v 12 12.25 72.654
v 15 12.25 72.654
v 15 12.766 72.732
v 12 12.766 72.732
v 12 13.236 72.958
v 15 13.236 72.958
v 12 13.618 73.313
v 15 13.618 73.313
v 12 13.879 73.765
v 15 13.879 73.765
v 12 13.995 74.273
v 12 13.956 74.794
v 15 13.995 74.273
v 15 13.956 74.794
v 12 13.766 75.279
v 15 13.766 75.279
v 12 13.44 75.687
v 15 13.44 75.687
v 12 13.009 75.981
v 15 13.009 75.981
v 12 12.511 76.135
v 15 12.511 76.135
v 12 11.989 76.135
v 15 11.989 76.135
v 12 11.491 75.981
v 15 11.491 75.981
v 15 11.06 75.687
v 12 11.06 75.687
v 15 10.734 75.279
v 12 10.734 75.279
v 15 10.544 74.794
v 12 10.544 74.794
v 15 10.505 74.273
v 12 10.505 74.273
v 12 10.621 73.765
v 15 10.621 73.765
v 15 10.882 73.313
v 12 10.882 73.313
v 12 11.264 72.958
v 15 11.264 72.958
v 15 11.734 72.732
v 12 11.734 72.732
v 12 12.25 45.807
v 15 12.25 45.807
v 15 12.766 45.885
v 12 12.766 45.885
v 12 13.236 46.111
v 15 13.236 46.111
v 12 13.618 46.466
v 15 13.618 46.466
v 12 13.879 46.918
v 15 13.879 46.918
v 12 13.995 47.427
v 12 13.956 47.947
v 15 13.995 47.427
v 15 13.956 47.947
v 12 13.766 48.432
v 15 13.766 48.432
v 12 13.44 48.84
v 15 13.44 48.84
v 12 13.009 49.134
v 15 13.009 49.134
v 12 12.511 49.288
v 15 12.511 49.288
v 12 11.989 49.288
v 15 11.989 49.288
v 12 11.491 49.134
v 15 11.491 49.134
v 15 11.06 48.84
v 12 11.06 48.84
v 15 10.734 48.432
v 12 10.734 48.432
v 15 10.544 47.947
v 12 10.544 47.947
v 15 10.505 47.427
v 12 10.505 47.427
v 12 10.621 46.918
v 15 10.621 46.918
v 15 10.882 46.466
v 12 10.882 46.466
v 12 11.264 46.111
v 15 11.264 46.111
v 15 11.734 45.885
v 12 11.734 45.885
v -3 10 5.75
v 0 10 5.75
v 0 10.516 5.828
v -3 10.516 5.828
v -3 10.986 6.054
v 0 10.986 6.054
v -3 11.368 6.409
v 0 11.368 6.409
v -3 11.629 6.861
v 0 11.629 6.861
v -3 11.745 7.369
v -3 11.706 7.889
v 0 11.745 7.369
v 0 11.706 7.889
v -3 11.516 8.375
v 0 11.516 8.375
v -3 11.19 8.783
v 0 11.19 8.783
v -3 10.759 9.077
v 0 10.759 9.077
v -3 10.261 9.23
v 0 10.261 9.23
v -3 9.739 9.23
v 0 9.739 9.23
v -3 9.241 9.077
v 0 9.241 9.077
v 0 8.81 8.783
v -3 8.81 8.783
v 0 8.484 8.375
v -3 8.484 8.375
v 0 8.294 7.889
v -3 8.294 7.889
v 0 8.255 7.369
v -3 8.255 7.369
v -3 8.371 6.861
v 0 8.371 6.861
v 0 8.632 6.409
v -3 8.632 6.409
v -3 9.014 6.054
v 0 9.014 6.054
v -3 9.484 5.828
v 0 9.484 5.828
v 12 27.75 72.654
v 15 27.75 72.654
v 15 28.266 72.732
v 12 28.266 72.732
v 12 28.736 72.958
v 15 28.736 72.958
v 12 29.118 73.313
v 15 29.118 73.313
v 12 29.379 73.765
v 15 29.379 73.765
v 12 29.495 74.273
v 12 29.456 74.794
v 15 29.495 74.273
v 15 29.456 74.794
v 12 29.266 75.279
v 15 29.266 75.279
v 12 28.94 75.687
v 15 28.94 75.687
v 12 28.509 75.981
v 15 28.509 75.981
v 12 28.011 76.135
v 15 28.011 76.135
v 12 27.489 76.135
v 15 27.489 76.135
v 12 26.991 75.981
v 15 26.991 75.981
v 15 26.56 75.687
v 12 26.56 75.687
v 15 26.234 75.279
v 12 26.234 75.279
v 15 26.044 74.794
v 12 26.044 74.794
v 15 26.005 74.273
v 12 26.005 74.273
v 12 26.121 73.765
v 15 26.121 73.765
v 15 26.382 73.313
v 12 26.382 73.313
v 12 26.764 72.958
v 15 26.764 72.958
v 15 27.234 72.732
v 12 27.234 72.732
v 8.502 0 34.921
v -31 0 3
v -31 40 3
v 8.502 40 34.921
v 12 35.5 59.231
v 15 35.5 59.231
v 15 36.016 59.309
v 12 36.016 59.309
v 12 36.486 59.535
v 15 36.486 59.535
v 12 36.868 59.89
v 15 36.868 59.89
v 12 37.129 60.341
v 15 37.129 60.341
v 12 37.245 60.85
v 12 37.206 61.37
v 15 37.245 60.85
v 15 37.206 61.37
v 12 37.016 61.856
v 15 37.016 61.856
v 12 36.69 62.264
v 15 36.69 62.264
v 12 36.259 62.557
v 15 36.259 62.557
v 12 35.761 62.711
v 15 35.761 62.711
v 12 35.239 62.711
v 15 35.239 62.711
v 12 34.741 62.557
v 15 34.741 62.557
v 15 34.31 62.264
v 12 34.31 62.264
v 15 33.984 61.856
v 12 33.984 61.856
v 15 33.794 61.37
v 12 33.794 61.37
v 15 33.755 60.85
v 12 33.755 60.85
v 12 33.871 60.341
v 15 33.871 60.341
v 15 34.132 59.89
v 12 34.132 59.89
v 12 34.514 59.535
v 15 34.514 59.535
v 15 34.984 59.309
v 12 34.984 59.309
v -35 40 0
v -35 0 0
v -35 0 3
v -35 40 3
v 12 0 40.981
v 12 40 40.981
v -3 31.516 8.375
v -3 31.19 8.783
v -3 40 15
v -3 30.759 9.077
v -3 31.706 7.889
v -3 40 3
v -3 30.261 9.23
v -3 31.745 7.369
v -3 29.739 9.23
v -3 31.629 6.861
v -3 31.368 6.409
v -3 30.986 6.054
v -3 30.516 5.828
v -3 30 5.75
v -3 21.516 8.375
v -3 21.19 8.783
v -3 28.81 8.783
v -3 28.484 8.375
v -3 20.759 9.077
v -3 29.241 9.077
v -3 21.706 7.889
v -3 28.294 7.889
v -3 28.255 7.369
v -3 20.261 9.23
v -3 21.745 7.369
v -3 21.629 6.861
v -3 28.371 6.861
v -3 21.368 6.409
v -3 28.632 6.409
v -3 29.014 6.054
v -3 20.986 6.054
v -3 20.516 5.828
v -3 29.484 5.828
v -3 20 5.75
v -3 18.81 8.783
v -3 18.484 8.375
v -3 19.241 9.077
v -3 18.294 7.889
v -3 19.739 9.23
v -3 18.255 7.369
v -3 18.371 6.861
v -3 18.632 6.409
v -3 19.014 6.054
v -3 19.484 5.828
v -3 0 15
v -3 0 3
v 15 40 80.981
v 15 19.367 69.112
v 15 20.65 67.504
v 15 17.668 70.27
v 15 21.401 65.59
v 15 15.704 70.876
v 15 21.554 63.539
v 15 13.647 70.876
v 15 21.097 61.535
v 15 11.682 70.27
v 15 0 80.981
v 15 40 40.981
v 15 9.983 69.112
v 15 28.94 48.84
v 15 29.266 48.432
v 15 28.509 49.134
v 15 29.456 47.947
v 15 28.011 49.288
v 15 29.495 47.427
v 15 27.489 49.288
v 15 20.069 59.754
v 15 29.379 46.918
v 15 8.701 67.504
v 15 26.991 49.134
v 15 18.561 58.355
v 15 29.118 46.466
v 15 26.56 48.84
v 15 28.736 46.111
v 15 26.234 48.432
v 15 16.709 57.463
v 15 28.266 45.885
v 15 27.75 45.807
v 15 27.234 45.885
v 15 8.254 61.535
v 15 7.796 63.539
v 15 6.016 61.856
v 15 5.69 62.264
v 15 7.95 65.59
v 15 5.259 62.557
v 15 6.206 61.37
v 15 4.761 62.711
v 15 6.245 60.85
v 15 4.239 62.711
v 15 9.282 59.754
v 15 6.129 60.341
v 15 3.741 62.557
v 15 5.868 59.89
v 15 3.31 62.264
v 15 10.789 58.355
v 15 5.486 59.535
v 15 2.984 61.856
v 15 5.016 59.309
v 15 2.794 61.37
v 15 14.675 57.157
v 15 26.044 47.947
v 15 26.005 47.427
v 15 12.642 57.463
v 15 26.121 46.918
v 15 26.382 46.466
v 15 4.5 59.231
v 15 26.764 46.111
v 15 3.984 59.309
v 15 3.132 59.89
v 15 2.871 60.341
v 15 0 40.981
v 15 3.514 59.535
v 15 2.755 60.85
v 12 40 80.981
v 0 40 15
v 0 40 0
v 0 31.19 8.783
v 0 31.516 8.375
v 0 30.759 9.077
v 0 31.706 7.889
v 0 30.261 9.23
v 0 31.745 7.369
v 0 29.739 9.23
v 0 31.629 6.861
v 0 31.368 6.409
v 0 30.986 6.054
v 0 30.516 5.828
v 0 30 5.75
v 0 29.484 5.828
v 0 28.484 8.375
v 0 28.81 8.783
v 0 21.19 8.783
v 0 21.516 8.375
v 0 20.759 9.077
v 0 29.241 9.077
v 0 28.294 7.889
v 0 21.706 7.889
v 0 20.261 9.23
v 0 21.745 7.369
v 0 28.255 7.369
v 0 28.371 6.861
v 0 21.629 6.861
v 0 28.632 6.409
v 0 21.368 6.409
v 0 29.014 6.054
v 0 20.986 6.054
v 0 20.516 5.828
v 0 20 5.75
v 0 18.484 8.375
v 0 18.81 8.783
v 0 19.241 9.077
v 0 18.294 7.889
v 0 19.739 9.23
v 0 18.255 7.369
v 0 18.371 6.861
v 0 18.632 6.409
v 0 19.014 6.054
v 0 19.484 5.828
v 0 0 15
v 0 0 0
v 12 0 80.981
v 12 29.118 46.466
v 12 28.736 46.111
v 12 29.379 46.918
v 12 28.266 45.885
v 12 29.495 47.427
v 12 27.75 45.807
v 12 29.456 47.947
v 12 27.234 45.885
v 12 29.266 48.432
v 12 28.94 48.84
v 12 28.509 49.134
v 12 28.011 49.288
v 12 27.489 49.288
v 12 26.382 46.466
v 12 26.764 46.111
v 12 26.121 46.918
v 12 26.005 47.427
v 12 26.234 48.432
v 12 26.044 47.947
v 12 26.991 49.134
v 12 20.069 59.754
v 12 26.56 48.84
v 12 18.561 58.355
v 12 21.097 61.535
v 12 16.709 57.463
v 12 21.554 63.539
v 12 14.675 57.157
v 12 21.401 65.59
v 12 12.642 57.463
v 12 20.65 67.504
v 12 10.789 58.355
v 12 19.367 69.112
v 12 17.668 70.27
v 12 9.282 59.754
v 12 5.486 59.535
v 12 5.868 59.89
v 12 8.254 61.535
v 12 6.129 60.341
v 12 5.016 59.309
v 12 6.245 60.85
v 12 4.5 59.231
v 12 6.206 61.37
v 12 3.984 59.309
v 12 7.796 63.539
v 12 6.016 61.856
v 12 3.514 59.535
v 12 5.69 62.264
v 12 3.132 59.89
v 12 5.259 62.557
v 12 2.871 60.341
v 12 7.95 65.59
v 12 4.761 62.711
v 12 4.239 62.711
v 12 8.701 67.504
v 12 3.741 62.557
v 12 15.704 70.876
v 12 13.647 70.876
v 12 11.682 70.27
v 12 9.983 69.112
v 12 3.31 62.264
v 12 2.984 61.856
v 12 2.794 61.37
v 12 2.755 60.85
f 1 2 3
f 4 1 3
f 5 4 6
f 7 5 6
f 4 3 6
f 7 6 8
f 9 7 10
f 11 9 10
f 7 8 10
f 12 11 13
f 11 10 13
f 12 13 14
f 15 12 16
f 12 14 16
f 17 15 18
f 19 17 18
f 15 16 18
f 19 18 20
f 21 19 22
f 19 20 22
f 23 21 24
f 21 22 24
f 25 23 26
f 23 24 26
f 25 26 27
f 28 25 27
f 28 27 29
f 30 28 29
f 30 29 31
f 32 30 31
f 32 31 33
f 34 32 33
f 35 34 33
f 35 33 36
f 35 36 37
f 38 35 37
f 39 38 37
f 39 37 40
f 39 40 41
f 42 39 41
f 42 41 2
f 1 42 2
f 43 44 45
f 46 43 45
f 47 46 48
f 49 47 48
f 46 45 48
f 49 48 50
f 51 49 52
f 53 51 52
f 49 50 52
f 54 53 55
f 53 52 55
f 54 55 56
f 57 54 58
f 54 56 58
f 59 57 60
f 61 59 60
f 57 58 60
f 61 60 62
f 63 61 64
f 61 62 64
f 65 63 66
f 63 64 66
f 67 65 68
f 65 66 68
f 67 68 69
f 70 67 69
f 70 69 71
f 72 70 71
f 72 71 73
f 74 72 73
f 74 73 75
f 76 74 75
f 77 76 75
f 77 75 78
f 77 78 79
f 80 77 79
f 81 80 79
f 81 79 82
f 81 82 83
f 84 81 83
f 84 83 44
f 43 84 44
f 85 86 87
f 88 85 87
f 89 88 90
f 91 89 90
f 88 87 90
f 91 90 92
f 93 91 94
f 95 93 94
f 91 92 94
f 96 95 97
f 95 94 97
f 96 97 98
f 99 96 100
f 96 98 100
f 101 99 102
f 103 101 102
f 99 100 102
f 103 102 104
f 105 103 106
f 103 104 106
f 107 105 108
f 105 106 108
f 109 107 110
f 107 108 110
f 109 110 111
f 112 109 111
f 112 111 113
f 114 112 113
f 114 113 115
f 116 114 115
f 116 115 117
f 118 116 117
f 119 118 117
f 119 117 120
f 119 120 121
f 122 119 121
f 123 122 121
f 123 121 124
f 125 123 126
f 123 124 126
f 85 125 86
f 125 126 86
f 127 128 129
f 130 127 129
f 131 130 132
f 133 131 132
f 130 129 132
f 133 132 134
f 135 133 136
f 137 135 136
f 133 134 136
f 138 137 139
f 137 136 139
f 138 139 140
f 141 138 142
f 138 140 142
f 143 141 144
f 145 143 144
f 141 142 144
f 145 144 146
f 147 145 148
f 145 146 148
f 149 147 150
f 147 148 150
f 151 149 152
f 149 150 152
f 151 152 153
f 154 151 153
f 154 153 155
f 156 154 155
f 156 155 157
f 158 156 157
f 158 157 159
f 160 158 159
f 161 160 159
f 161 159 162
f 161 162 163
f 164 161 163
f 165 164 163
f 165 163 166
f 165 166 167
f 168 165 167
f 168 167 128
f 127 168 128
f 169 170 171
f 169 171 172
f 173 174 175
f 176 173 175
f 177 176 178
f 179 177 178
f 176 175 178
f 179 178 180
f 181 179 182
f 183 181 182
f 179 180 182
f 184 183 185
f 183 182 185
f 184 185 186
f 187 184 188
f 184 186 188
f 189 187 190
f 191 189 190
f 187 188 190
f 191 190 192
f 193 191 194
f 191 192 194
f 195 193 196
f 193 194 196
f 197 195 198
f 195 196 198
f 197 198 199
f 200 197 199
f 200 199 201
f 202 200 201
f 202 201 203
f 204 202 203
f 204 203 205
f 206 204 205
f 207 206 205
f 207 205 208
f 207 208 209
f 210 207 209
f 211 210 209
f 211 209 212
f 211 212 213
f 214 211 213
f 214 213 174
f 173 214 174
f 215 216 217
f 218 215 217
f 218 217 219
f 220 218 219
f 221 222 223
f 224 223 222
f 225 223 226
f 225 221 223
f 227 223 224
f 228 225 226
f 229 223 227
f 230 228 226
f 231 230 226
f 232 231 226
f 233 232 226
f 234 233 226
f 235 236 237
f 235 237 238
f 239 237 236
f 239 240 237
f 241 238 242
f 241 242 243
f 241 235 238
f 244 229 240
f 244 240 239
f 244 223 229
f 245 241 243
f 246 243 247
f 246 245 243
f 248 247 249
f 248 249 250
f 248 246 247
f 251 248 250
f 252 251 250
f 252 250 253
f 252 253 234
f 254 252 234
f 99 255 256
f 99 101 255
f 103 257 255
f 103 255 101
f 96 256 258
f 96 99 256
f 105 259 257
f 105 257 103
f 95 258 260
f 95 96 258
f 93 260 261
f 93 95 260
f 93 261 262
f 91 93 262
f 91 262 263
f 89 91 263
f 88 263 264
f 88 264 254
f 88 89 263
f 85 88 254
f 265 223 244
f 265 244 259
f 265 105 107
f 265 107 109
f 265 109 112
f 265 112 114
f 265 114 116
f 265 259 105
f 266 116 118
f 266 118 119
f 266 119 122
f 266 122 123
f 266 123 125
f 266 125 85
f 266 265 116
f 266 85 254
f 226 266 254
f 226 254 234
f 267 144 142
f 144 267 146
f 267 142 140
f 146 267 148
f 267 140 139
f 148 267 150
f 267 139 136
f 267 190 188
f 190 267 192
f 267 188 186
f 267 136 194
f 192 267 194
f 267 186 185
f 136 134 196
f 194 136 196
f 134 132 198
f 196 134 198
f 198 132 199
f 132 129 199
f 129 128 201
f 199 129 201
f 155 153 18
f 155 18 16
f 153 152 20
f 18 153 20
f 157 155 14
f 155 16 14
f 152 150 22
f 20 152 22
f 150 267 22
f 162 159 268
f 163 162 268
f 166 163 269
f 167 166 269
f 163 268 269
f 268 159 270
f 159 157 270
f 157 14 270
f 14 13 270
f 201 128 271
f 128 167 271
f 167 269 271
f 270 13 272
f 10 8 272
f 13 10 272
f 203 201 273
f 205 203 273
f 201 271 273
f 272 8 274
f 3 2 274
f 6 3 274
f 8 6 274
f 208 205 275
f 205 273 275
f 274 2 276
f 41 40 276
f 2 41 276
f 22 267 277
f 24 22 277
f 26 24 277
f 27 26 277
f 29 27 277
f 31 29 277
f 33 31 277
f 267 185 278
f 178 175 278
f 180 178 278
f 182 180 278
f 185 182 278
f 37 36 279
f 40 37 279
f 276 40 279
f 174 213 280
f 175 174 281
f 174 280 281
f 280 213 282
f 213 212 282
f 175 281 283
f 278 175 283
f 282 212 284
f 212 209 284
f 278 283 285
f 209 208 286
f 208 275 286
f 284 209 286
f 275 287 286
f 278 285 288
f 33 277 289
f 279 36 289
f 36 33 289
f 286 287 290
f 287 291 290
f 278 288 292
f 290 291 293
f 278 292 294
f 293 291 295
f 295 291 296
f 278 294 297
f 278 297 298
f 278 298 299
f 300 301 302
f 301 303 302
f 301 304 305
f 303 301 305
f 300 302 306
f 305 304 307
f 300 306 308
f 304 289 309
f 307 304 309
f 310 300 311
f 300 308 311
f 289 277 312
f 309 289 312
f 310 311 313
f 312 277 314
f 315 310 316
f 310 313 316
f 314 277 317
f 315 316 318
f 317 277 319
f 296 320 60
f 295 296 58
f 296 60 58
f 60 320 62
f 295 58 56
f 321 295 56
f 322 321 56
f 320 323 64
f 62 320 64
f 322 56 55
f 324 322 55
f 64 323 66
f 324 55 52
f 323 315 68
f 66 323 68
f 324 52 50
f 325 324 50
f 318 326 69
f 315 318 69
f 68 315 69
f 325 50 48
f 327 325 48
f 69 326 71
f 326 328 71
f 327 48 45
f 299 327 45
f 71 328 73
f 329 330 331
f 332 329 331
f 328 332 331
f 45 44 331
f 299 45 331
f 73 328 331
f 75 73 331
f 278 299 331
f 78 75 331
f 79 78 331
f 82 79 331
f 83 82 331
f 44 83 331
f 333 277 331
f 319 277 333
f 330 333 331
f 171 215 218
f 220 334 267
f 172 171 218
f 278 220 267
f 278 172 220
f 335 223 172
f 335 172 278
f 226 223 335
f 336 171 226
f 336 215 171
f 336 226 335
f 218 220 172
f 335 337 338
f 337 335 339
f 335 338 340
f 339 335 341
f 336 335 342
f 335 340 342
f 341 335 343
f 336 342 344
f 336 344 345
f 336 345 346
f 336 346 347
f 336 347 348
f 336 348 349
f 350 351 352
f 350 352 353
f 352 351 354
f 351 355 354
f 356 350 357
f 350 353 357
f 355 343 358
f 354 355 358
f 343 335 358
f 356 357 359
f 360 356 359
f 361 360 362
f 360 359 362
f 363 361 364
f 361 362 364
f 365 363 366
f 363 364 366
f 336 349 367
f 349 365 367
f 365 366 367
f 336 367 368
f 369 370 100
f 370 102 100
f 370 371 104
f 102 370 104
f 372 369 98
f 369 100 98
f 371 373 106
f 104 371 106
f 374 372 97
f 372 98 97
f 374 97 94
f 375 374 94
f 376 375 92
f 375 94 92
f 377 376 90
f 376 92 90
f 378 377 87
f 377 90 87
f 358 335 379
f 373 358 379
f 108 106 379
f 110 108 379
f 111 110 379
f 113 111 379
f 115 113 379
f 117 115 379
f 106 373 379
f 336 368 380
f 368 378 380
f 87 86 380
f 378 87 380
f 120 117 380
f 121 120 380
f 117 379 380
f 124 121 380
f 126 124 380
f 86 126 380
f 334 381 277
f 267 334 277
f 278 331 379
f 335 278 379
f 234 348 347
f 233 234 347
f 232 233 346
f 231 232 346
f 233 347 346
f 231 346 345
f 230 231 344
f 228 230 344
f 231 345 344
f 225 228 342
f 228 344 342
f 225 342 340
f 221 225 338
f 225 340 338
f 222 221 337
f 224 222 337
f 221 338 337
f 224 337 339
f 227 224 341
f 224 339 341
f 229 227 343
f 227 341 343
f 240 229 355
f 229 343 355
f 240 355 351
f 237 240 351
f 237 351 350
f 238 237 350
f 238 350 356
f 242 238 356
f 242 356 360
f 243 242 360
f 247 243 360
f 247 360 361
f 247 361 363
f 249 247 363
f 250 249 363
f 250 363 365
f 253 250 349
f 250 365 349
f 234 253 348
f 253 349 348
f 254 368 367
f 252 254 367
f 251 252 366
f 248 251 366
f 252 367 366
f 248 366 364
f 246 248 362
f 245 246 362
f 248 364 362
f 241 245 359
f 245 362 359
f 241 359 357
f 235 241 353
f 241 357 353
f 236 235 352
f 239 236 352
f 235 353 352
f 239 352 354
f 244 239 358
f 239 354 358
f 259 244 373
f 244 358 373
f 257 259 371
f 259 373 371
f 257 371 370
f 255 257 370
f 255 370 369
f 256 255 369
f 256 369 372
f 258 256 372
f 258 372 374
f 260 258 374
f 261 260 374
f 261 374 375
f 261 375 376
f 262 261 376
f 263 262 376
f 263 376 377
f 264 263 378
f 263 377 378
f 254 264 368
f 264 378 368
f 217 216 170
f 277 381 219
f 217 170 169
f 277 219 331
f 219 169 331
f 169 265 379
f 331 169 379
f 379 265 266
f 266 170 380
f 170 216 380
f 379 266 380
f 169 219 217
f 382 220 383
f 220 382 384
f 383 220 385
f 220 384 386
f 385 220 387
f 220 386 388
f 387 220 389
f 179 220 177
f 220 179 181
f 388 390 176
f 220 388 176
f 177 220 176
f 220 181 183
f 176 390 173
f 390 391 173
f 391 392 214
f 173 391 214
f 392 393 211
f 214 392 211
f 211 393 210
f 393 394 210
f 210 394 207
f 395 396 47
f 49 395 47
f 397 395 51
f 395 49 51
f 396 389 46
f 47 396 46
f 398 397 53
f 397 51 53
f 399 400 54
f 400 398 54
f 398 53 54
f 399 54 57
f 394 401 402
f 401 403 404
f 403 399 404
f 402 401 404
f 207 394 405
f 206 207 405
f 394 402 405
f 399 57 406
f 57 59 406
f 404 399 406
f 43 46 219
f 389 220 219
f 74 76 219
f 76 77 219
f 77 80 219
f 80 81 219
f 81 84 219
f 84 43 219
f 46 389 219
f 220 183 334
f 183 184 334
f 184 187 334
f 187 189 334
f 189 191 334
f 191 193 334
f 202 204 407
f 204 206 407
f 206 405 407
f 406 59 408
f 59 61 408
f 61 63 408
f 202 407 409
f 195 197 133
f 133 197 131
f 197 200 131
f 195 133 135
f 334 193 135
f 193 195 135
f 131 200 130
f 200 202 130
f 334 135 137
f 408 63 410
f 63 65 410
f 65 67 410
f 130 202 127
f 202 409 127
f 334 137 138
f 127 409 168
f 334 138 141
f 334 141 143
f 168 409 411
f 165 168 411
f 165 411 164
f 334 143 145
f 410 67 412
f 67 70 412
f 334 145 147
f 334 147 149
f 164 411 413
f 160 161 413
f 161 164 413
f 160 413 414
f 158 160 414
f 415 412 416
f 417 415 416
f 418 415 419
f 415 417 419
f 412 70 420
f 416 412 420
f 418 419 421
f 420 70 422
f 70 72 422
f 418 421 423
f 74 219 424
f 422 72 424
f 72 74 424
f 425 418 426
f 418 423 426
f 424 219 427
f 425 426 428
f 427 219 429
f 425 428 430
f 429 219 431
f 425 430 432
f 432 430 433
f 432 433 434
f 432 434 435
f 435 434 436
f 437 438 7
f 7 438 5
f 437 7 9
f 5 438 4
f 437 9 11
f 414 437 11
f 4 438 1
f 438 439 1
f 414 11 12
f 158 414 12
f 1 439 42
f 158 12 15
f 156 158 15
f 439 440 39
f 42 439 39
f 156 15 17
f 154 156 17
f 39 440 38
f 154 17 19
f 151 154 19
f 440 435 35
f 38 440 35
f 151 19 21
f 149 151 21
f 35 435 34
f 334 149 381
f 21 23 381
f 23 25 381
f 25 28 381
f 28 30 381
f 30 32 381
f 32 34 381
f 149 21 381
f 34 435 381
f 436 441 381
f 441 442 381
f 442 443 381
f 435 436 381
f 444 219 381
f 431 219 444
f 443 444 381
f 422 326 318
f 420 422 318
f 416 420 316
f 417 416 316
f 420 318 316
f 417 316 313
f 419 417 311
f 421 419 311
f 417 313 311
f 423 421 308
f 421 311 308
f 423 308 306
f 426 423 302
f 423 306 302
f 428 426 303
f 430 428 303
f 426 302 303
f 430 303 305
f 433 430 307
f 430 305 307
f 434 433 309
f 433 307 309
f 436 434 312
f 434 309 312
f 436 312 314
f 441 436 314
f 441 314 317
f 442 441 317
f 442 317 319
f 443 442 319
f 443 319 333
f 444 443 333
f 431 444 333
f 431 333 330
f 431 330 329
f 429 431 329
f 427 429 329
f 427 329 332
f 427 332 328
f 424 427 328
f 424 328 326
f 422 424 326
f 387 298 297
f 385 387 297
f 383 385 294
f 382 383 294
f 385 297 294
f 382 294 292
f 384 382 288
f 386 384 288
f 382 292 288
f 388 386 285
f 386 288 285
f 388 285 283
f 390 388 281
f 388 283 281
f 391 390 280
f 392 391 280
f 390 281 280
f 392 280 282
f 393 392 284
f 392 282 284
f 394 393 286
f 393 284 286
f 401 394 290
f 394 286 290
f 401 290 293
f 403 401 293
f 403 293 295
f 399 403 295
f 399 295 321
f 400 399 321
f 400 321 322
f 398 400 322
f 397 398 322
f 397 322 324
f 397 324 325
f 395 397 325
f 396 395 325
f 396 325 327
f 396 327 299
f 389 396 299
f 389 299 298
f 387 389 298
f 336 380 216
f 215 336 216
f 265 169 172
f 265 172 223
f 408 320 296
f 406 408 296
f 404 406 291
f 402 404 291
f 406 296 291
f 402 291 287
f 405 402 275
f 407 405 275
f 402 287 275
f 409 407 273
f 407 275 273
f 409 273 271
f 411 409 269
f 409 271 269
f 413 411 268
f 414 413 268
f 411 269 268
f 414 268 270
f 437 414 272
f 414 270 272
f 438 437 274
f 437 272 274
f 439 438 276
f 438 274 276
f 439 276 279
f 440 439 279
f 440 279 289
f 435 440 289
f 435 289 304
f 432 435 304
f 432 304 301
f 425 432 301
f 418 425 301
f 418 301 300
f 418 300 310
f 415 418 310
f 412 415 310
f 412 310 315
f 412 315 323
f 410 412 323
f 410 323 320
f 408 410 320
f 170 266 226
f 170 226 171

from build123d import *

# Parameters (mm, degrees)
Y_KSEKLIK_EKSTR_ZYON1_DEPTH = 40
IZIM3_R                     = 1.75
KES_EKSTR_ZYON2_DEPTH       = 3
IZIM4_R                     = 1.75
IZIM4_R_2                   = 6.898282176
KES_EKSTR_ZYON3_DEPTH       = 37


with BuildPart() as part:
    # Çizim1 → Yükseklik-Ekstrüzyon1 (new body)
    with BuildSketch(Plane(origin=(0, 0, 0), x_dir=(1, 0, 0), z_dir=(0, 1, 0))):
        Polygon((0, 0), (-35, 0), (-35, -3), (12, -40.980762114), (12, -80.980762114), (15, -80.980762114), (15, -40.980762114), (0, -15), align=None)
        Polygon((-3, -15), (-3, -3), (-31, -3), (8.501534624, -34.921242333), align=None, mode=Mode.SUBTRACT)
    extrude(amount=Y_KSEKLIK_EKSTR_ZYON1_DEPTH)

    # Çizim3 → Kes-Ekstrüzyon2 (cut)
    with BuildSketch(Plane(origin=(0, 0, 0), x_dir=(0, 0, -1), z_dir=(1, 0, 0))):
        with Locations((-7.5, 20)):
            Circle(IZIM3_R)
        with Locations((-7.5, 30)):
            Circle(IZIM3_R)
        with Locations((-7.5, 10)):
            Circle(IZIM3_R)
    extrude(amount=-KES_EKSTR_ZYON2_DEPTH, mode=Mode.SUBTRACT)

    # Çizim4 → Kes-Ekstrüzyon3 (cut)
    with BuildSketch(Plane(origin=(15, 0, 0), x_dir=(0, 0, -1), z_dir=(1, 0, 0))):
        with Locations((-60.980762114, 35.5)):
            Circle(IZIM4_R)
        with Locations((-47.557368355, 27.75)):
            Circle(IZIM4_R)
        with Locations((-47.557368355, 12.25)):
            Circle(IZIM4_R)
        with Locations((-60.980762114, 4.5)):
            Circle(IZIM4_R)
        with Locations((-74.404155872, 12.25)):
            Circle(IZIM4_R)
        with Locations((-74.404155872, 27.75)):
            Circle(IZIM4_R)
        with Locations((-64.054903201, 14.675431446)):
            Circle(IZIM4_R_2)
    extrude(amount=-KES_EKSTR_ZYON3_DEPTH, mode=Mode.SUBTRACT)


solid = part.part
